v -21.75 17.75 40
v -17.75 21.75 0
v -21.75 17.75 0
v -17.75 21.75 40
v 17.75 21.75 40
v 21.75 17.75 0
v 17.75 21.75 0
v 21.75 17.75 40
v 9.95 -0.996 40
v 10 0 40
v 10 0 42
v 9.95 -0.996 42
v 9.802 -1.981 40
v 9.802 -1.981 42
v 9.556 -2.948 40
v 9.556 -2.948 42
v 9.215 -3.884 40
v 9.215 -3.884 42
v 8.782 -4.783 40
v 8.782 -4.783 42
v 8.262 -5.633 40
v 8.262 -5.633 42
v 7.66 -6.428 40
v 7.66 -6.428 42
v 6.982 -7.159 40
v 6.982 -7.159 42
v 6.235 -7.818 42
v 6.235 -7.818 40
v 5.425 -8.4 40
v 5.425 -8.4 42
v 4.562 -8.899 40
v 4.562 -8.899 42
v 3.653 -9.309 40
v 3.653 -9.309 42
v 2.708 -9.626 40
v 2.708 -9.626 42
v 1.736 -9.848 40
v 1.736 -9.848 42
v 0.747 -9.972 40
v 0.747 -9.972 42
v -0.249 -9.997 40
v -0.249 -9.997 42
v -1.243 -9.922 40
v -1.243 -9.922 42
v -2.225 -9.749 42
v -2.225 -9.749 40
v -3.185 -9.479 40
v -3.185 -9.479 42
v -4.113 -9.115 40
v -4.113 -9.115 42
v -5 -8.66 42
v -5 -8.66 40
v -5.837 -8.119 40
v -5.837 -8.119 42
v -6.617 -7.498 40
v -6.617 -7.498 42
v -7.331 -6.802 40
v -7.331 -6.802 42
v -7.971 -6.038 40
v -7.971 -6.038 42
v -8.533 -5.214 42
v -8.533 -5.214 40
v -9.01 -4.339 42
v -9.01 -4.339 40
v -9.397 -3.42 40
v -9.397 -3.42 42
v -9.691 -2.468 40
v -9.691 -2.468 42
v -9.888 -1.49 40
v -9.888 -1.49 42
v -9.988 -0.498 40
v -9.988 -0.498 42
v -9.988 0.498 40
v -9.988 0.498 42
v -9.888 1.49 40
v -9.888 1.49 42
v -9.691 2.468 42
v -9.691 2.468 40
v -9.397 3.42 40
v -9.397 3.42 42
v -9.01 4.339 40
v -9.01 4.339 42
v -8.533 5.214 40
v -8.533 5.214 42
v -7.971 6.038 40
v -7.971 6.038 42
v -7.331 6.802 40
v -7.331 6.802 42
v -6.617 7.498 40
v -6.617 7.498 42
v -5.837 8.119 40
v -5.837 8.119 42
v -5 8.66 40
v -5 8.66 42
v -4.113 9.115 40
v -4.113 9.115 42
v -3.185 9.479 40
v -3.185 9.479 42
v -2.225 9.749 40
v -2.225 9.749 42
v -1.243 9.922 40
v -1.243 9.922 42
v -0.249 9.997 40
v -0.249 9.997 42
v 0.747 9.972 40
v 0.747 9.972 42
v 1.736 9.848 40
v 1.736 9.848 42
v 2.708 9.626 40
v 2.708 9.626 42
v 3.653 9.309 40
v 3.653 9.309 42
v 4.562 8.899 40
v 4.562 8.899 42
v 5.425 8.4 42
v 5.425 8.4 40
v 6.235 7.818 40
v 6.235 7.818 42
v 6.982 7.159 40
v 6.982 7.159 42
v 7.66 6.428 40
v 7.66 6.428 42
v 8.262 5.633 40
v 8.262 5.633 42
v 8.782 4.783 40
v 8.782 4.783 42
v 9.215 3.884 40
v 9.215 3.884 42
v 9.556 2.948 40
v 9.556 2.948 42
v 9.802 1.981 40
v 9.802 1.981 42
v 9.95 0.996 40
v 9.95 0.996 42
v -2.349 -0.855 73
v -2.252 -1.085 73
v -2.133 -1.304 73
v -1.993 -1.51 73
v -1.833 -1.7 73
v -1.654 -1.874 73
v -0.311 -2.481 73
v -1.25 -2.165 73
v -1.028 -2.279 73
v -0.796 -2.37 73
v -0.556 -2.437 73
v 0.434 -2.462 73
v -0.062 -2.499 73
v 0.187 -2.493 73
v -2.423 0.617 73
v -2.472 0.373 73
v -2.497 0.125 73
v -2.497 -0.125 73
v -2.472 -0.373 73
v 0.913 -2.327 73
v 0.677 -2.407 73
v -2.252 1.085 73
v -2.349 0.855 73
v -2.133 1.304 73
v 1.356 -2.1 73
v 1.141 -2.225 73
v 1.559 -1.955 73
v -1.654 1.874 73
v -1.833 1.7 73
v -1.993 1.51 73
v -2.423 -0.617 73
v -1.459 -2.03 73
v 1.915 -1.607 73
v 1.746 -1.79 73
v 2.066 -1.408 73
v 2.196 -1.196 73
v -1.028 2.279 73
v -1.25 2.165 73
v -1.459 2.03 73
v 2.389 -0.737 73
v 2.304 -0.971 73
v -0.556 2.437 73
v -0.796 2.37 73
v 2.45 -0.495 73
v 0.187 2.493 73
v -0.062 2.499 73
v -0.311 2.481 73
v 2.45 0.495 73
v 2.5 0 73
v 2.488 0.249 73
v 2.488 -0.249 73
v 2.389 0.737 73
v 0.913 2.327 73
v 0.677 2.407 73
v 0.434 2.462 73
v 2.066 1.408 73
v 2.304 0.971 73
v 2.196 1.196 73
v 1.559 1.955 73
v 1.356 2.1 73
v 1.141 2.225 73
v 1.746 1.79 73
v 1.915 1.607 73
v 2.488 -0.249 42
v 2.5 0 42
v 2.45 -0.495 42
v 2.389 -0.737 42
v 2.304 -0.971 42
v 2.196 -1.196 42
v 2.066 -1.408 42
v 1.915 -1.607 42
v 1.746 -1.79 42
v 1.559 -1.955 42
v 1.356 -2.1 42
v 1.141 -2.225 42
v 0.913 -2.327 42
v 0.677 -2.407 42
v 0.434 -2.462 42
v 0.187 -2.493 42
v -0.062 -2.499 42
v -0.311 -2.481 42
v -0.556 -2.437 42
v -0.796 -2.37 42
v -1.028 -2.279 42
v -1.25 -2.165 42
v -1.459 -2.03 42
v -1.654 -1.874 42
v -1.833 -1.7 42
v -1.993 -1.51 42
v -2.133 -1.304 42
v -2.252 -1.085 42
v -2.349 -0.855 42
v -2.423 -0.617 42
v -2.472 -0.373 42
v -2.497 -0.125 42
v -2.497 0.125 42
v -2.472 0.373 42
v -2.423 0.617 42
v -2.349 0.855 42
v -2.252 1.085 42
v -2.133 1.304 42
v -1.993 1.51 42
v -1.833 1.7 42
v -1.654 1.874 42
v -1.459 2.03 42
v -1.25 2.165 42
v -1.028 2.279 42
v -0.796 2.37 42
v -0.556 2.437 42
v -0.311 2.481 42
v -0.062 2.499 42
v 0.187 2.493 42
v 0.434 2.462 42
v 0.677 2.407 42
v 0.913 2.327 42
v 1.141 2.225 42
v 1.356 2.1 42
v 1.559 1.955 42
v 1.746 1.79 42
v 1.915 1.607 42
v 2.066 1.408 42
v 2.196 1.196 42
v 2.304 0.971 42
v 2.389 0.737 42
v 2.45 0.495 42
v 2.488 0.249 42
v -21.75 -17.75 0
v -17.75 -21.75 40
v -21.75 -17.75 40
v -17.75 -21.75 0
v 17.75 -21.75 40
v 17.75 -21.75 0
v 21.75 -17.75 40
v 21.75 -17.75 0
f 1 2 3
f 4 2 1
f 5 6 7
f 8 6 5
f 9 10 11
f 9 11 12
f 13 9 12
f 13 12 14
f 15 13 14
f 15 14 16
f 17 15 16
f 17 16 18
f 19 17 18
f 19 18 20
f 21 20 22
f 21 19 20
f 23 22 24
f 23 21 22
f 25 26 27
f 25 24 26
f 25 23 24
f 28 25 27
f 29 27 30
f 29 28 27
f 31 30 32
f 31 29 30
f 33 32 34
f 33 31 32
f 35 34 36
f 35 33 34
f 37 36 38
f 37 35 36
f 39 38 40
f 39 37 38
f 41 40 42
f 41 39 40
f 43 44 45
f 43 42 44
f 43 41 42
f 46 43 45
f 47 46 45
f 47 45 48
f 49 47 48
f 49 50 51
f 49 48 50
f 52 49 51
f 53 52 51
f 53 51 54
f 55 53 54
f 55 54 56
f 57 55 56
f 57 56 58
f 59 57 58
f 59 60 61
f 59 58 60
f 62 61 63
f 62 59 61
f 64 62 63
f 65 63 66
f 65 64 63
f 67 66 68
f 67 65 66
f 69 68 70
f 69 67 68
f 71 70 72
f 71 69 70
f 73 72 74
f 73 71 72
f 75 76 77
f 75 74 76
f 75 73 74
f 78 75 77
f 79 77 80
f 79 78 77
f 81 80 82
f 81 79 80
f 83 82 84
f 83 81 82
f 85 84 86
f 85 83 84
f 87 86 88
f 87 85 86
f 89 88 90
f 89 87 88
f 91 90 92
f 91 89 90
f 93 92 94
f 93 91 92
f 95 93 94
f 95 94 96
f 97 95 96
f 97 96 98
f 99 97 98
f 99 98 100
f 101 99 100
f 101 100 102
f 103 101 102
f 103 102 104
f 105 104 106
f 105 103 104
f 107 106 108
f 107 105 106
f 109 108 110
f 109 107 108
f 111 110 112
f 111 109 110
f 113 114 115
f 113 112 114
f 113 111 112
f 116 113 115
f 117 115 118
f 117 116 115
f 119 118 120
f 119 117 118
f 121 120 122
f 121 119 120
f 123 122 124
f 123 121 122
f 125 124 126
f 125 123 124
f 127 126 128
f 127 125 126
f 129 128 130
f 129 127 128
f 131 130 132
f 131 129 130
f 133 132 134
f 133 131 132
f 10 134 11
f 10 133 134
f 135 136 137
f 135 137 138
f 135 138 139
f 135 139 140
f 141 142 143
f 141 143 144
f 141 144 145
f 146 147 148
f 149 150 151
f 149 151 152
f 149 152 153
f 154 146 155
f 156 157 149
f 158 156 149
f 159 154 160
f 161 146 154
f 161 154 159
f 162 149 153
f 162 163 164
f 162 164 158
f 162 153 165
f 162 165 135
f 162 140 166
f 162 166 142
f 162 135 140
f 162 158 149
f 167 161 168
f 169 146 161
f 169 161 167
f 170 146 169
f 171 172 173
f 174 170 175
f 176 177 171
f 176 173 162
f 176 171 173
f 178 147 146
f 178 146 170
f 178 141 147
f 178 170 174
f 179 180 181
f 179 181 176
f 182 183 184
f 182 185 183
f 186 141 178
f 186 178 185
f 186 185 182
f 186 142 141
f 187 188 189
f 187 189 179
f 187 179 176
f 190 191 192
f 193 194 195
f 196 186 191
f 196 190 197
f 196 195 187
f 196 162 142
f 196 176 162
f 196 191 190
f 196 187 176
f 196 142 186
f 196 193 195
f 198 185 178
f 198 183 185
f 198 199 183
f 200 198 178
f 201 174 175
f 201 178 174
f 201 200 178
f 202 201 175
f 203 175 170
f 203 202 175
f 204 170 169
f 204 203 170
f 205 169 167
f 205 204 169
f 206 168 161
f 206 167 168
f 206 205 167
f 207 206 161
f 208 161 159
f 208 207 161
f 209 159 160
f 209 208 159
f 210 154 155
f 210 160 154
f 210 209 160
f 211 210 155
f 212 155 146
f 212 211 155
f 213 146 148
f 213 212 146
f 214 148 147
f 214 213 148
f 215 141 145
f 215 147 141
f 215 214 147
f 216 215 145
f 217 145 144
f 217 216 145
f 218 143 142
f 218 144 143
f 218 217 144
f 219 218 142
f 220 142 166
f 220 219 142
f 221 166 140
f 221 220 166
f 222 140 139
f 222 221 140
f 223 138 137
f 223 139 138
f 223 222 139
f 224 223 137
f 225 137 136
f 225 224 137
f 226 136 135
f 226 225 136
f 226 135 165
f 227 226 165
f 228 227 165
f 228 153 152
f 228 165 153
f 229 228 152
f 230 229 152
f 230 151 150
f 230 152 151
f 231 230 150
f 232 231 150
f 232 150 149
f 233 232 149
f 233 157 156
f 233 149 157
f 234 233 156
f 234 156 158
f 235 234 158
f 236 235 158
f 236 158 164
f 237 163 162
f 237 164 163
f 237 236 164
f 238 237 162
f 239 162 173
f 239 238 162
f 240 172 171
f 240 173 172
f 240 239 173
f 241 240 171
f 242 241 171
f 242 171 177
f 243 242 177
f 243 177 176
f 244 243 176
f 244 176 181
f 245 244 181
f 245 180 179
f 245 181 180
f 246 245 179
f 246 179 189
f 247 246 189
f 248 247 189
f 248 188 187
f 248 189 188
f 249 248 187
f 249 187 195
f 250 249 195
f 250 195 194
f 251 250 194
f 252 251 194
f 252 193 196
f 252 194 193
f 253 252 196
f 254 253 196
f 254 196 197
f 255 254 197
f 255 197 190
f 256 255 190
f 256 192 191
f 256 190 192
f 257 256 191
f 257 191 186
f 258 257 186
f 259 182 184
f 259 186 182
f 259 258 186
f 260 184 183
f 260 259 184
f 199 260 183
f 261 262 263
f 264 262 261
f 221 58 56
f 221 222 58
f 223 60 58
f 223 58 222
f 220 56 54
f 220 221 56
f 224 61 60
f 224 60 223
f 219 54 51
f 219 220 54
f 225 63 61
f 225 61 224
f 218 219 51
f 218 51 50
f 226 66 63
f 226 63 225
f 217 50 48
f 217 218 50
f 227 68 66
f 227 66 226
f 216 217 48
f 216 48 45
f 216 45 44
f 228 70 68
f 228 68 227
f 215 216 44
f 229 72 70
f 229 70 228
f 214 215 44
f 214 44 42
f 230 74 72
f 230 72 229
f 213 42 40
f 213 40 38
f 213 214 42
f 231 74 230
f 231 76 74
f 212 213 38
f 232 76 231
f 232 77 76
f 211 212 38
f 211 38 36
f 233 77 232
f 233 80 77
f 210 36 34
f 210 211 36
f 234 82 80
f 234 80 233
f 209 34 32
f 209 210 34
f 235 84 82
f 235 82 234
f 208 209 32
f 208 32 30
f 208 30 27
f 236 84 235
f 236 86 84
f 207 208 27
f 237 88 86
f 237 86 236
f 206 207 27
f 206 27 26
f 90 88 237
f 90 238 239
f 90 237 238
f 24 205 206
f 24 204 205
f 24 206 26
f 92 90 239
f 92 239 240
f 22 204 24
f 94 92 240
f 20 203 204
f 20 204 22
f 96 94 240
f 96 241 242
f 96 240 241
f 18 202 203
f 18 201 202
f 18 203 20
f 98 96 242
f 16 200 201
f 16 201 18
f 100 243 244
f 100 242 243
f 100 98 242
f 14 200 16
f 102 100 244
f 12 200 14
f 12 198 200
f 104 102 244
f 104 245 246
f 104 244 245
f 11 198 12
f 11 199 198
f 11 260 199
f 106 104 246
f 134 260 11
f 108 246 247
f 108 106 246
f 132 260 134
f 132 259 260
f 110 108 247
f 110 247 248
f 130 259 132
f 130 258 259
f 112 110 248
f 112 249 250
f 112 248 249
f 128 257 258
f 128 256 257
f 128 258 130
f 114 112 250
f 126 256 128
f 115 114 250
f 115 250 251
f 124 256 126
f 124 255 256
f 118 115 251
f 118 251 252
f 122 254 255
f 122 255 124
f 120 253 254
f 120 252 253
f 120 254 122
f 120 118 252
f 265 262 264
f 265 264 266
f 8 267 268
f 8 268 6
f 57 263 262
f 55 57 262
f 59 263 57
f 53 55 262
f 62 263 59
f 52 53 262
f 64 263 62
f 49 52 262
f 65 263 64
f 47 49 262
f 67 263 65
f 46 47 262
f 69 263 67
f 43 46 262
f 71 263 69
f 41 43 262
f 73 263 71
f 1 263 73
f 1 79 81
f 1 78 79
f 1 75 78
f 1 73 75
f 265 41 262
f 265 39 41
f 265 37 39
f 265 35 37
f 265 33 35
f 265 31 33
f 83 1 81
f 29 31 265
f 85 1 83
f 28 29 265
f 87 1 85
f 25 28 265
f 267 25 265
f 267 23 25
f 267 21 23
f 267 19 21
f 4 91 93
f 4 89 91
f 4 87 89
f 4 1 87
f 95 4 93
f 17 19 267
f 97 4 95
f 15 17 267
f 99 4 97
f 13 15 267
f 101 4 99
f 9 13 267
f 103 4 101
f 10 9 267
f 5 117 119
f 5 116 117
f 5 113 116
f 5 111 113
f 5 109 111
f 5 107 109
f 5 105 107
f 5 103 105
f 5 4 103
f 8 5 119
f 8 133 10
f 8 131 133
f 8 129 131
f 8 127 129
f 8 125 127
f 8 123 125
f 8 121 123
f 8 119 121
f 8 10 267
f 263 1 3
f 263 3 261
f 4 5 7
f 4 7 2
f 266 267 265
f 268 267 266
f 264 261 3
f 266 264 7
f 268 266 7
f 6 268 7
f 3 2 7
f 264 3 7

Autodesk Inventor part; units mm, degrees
ref_plane "YZ Plane" through (0, 0, 0) normal (1, 0, 0) x (0, 1, 0)
ref_plane "XZ Plane" through (0, 0, 0) normal (0, 1, 0) x (-1, 0, 0)
ref_plane "XY Plane" through (0, 0, 0) normal (0, 0, 1) x (1, 0, 0)
sketch "Sketch1" plane through (0, 0, 0) normal (0, 0, 1) x (1, 0, 0)
  line L0 (-21.75, -21.75) -> (21.75, -21.75)
  line L1 (21.75, -21.75) -> (21.75, 21.75)
  line L2 (21.75, 21.75) -> (-21.75, 21.75)
  line L3 (-21.75, 21.75) -> (-21.75, -21.75)
  line L4 (-21.75, -21.75) -> (21.75, 21.75) construction
  line L5 (21.75, -21.75) -> (-21.75, 21.75) construction
  point P0 (0, 0)
  dimension "d0" = 43.5
extrude "Extrusion1" add sketch "Sketch1" along normal blind 40
sketch "Sketch2" plane through (0, 0, 40) normal (0, 0, 1) x (1, 0, 0)
  circle A0 centre (0, 0) radius 10
  dimension "d3" = 20
extrude "Extrusion2" add sketch "Sketch2" along normal blind 2
sketch "Sketch3" plane through (0, 0, 42) normal (0, 0, 1) x (1, 0, 0)
  circle A0 centre (0, 0) radius 2.5
  dimension "d6" = 5
extrude "Extrusion3" add sketch "Sketch3" along normal blind 31
chamfer "Chamfer1" distance 4 angle 45 4 edges at (21.75, 21.75, 20) (-21.75, 21.75, 20) (21.75, -21.75, 20) (-21.75, -21.75, 20)
properties part number "Stepper Simulation"
